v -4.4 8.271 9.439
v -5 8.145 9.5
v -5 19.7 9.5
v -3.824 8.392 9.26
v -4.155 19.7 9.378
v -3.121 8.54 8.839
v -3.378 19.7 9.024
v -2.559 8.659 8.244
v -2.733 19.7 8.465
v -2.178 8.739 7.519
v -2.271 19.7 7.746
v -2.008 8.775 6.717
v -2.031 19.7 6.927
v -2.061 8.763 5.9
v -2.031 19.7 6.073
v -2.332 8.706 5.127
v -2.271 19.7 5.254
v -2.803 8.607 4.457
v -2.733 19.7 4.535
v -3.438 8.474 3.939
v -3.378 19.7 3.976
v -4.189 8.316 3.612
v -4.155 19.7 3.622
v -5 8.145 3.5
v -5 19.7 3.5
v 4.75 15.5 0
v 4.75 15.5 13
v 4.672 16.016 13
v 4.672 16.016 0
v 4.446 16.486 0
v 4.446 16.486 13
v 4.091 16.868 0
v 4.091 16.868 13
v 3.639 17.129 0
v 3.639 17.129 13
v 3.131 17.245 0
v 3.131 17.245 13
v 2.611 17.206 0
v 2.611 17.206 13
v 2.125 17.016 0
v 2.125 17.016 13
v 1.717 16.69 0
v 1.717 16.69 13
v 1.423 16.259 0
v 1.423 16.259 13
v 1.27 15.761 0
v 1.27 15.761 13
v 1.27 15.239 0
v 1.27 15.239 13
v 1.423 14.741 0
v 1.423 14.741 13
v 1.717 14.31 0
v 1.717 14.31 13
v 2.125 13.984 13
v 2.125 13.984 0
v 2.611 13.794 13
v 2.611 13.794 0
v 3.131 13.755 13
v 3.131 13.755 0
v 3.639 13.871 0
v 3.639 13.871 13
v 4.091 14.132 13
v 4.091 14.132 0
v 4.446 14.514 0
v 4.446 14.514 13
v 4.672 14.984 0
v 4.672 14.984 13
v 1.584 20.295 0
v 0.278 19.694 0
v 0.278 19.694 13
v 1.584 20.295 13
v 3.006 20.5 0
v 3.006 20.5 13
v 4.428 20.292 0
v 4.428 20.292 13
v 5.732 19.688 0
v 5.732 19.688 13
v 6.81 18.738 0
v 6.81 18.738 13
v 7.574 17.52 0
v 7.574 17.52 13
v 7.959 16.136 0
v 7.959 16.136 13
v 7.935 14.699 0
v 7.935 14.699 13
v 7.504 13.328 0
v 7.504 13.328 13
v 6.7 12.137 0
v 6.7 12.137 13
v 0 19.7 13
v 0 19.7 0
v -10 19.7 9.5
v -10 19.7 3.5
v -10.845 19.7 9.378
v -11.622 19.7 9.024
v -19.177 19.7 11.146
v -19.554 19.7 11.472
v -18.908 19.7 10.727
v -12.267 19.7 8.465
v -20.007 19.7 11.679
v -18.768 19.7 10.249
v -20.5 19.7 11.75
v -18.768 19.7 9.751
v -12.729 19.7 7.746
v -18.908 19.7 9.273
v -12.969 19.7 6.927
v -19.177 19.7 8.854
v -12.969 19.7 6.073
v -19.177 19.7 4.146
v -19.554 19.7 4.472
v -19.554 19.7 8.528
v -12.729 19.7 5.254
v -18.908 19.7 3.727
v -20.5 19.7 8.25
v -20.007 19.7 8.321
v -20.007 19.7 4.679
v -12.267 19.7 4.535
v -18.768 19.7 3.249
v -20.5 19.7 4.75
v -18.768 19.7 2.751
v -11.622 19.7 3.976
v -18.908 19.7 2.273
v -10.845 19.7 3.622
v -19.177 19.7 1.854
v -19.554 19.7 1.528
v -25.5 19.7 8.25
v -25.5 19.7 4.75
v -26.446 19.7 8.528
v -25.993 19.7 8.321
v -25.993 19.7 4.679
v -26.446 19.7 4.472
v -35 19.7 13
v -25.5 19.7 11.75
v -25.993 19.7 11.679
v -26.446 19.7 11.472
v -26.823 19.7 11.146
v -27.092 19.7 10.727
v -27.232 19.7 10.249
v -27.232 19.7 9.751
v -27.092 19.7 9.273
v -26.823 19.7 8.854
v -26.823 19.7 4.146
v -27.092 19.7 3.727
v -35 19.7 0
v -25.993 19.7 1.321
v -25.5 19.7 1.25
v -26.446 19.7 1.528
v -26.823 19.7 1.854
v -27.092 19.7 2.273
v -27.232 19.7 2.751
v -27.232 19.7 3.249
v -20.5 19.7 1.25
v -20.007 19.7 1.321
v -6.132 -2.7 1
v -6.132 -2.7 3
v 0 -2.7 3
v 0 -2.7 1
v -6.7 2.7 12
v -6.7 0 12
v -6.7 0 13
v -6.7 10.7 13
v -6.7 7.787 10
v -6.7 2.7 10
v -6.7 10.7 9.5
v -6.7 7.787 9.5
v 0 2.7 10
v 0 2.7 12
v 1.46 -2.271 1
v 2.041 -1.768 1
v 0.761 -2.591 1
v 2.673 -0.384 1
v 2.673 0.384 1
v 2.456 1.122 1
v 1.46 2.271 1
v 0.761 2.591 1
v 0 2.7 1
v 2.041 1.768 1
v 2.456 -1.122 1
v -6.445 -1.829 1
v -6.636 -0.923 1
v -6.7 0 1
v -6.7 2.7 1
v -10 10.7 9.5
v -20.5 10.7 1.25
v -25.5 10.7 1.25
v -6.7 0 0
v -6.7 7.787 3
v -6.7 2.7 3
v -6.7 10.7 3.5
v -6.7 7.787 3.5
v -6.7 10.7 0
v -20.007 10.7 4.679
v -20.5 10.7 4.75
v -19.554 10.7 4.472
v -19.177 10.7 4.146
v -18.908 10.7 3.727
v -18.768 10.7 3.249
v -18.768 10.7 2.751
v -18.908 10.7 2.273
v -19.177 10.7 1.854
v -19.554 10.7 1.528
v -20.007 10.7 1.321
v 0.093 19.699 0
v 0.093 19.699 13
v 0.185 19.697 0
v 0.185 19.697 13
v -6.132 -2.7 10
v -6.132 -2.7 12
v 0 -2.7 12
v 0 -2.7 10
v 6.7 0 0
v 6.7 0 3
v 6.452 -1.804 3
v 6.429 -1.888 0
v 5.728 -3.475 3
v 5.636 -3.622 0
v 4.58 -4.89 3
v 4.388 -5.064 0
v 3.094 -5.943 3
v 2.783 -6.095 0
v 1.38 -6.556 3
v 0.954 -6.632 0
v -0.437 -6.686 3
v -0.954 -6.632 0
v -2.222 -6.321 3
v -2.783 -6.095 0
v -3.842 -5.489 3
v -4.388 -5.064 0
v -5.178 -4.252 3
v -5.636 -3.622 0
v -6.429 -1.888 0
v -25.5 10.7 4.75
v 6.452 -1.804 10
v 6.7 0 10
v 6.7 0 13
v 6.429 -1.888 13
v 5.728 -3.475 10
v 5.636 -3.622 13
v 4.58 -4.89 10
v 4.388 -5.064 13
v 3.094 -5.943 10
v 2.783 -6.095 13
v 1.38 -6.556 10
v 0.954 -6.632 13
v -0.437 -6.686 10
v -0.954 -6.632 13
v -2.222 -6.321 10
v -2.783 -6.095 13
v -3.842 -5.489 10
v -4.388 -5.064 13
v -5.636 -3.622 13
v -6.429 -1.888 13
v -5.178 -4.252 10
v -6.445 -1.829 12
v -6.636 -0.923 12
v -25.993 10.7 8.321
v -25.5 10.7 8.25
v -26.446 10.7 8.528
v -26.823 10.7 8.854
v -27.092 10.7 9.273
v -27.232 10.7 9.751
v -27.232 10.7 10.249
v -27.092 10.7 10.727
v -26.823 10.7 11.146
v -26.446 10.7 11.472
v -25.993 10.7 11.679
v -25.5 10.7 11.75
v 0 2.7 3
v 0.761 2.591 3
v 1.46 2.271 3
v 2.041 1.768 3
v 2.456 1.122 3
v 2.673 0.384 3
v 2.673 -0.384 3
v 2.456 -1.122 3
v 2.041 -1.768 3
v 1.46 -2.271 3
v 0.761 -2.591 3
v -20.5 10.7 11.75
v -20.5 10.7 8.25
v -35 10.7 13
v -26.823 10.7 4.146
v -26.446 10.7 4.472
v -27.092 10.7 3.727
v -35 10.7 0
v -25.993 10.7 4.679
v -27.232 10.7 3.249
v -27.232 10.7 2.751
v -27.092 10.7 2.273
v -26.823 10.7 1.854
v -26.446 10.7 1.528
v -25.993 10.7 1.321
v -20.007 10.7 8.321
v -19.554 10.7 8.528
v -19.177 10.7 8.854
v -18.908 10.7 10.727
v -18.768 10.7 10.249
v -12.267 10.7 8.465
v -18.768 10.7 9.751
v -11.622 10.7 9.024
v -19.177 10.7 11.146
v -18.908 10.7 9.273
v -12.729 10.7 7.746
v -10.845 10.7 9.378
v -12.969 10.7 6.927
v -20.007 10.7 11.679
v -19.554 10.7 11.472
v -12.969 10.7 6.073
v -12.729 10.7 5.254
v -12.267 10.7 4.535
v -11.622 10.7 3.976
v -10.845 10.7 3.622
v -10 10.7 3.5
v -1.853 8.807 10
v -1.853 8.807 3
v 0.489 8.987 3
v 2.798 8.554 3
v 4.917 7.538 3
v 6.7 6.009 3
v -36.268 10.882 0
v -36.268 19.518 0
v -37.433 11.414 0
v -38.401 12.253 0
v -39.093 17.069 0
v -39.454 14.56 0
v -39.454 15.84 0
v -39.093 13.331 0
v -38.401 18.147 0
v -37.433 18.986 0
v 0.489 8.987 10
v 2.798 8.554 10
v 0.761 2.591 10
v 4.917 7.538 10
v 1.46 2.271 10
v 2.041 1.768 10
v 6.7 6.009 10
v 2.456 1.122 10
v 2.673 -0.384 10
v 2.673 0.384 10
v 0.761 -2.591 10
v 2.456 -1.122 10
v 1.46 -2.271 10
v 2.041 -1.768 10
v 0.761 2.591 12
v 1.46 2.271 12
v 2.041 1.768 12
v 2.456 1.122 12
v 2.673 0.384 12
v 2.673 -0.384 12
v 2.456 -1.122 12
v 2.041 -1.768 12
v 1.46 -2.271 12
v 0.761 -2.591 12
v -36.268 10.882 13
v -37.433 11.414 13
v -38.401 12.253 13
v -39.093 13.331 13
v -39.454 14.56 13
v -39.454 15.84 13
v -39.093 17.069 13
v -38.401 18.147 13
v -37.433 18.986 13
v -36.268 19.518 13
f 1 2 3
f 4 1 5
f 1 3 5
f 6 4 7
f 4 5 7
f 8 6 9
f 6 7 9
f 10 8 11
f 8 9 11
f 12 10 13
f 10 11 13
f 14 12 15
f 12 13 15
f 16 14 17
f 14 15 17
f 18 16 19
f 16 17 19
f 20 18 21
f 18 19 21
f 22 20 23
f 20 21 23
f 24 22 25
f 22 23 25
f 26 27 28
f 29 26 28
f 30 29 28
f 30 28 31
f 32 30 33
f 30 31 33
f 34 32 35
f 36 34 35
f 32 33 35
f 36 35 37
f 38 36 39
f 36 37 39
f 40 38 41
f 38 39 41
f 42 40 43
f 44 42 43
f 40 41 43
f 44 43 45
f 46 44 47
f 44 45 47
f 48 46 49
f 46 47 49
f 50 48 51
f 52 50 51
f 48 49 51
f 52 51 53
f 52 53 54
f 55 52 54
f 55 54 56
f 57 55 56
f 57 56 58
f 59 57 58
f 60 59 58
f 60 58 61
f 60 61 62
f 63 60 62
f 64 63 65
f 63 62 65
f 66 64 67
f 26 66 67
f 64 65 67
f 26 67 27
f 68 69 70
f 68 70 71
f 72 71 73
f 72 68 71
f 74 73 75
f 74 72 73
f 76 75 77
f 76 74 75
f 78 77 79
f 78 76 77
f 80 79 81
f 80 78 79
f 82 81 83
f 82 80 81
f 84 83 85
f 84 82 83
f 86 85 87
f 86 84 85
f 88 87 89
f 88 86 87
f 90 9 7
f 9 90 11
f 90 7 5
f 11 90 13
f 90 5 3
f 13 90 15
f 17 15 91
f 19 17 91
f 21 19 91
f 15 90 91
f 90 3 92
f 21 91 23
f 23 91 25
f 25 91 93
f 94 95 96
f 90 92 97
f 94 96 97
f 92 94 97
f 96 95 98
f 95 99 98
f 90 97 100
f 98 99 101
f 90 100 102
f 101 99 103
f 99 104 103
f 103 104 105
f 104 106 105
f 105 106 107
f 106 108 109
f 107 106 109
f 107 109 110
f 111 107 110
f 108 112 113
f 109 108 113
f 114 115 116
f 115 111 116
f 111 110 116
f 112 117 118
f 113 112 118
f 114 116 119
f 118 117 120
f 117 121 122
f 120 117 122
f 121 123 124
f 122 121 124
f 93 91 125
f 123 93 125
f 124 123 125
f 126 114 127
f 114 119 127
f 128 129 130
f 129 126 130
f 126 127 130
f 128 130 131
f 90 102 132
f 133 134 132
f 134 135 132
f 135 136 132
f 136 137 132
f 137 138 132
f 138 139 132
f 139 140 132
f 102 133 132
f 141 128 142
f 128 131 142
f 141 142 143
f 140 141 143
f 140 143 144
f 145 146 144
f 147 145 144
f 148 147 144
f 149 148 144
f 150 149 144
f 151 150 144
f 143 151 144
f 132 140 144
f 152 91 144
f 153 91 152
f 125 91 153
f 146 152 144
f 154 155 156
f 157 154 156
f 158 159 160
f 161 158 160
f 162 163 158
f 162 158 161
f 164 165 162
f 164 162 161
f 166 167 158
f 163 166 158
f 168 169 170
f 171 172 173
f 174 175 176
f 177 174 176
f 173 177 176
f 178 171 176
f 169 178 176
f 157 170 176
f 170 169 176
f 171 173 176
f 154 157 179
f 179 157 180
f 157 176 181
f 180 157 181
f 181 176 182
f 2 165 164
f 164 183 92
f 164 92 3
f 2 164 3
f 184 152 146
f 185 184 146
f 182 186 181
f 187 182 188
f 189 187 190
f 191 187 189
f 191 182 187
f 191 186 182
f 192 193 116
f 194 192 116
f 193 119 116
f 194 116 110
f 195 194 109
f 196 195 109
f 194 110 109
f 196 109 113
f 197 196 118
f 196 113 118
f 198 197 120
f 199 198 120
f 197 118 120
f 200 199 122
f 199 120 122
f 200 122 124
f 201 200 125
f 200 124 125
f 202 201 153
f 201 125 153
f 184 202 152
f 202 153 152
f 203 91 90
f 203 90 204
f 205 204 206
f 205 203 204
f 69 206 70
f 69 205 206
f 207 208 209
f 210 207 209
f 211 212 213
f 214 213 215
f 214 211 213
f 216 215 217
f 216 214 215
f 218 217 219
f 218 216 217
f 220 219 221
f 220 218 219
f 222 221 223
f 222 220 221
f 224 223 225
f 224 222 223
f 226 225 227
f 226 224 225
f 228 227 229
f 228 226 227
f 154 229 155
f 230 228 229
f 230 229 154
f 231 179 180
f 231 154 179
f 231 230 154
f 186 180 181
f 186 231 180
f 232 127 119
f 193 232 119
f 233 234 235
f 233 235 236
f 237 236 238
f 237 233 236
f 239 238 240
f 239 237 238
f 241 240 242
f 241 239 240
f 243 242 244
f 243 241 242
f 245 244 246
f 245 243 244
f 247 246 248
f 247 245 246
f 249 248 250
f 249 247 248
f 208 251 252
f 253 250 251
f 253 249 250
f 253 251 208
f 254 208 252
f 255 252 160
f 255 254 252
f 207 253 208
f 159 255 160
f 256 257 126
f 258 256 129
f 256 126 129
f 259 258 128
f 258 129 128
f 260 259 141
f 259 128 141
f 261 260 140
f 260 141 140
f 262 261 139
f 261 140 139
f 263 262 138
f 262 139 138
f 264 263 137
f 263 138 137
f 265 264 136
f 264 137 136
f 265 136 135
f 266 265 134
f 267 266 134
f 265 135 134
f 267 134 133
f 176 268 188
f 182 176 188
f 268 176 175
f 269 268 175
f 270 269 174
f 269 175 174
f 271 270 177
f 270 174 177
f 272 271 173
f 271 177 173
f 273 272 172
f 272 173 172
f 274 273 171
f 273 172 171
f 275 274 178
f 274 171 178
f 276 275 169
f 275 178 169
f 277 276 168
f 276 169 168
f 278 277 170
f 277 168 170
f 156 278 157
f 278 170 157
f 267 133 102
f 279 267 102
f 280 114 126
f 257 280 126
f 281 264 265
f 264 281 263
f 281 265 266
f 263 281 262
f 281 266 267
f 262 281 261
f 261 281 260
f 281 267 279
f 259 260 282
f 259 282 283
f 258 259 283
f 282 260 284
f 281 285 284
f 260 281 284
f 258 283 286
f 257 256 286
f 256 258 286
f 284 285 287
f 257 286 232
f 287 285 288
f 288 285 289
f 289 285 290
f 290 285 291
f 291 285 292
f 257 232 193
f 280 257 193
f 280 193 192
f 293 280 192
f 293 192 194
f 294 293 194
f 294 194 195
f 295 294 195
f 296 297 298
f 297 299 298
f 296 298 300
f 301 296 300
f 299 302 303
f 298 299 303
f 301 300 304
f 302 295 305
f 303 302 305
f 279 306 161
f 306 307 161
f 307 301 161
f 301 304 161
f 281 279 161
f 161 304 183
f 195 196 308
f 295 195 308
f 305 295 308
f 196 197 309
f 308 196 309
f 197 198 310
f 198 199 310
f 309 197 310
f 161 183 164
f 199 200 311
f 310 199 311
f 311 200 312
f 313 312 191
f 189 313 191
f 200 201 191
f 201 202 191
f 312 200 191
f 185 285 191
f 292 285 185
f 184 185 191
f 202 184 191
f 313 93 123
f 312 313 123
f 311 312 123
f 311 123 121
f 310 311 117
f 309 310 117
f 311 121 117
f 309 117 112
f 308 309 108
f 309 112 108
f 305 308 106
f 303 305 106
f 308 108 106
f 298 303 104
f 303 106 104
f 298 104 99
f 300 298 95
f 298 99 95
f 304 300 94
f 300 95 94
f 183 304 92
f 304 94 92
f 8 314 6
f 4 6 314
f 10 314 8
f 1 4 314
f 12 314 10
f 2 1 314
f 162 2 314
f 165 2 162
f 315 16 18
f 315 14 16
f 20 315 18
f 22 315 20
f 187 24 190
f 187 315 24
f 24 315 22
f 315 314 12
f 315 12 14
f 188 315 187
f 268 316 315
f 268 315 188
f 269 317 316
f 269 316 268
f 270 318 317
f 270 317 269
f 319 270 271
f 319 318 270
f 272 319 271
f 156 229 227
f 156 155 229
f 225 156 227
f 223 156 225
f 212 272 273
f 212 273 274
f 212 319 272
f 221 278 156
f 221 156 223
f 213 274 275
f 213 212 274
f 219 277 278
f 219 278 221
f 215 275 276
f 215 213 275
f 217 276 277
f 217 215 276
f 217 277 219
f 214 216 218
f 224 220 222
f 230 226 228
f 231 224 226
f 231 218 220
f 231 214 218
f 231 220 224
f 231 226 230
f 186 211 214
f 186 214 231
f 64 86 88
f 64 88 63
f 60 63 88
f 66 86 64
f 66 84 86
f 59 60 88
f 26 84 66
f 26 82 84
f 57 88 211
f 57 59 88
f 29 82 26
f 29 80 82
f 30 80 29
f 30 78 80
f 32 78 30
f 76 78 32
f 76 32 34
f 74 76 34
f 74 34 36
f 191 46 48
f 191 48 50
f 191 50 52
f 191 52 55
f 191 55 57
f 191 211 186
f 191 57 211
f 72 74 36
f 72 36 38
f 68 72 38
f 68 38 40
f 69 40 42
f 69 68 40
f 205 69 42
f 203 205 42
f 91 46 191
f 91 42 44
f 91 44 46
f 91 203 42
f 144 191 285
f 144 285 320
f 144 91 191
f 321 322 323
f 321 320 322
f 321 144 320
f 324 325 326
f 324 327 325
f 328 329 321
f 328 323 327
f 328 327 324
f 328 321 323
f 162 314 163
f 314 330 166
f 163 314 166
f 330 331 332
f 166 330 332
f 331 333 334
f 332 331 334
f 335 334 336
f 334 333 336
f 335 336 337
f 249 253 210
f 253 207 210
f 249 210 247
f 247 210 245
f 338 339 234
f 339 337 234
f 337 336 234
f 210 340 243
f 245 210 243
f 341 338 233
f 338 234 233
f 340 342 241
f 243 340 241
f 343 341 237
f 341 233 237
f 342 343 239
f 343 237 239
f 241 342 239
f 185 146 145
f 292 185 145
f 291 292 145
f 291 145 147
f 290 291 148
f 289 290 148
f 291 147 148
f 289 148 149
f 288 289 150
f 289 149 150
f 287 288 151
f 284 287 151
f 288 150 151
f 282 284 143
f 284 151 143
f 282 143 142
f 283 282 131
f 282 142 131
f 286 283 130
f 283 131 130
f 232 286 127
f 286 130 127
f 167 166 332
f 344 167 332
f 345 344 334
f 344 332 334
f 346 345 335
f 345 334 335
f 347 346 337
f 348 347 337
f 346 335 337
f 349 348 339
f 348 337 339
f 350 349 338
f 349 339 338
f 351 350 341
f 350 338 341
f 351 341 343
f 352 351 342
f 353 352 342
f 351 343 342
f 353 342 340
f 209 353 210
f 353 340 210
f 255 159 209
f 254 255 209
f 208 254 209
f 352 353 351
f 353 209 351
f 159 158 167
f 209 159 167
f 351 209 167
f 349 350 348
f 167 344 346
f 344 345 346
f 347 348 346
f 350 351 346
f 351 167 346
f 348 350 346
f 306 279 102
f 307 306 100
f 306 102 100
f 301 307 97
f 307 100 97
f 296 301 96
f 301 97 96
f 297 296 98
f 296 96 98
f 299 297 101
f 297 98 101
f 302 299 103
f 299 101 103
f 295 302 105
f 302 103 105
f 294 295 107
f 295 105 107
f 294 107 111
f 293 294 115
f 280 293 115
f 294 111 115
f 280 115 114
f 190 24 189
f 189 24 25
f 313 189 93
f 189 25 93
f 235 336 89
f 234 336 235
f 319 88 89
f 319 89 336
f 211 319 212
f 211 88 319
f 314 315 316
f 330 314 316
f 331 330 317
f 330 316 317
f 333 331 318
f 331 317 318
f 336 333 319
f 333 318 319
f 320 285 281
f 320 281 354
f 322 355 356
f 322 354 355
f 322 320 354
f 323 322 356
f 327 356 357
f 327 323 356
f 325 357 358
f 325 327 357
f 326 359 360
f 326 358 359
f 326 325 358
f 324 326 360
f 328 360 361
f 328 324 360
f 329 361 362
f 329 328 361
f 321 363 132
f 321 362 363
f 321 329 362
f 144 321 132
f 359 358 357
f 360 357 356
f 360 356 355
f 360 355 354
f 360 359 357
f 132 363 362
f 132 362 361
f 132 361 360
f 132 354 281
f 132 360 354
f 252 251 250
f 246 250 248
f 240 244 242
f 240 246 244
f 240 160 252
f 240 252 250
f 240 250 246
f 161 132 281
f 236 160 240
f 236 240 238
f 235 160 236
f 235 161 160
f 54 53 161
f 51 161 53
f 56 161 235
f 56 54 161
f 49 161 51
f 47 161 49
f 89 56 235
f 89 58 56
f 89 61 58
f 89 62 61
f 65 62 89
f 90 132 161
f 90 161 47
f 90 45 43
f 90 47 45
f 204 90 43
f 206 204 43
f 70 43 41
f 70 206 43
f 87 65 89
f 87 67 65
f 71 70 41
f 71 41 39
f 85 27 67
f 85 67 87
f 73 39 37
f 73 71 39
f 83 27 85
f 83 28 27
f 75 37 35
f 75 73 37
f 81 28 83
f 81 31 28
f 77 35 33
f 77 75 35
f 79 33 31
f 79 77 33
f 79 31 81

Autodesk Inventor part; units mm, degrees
ref_plane "YZ Plane" through (0, 0, 0) normal (1, 0, 0) x (0, 1, 0)
ref_plane "XZ Plane" through (0, 0, 0) normal (0, 1, 0) x (-1, 0, 0)
ref_plane "XY Plane" through (0, 0, 0) normal (0, 0, 1) x (1, 0, 0)
sketch "Sketch1" plane through (0, 0, 0) normal (0, 0, 1) x (1, 0, 0)
  circle A0 centre (0, 0) radius 2.7
  line L0 (0, 0) -> (0, 13) construction
  line L1 (-6.7, 0) -> (-6.7, 13)
  line L2 (6.7, 13) -> (6.7, 0)
  arc A1 (-6.7, 0) -> (6.7, 0) centre (0, 0) ccw
  arc A2 (6.7, 13) -> (-6.7, 13) centre (0, 13) ccw
  circle A3 centre (0, 0) radius 2.5 construction
  line L3 (-35, 15.2) -> (0, 15.2) construction
  line L4 (-35, 10.7) -> (0, 10.7)
  line L5 (0, 19.7) -> (-35, 19.7)
  arc A4 (-35, 19.7) -> (-35, 10.7) centre (-35, 15.2) ccw
  arc A5 (0, 10.7) -> (0, 19.7) centre (0, 15.2) ccw
  line L6 (0, 13) -> (0, 19.7) construction
  circle A6 centre (3, 15.5) radius 1.5 construction
  circle A7 centre (3, 15.5) radius 5
  point P0 (0, 6.5)
  point P1 (-17.5, 15.2)
  dimension "d2" = 0.2
  dimension "d3" = 4
  dimension "d5" = 13
  dimension "d10" = 9
  dimension "d11" = 35
  dimension "d12" = 10
extrude "Extrusion1" add sketch "Sketch1" along normal blind 13
sketch "Sketch8" plane through (0, 0, 13) normal (0, 0, 1) x (1, 0, 0)
  line L0 (0, 2.7) -> (-16.9826, 2.7)
  line L1 (-16.9826, -2.7) -> (0, -2.7)
  arc A0 (0, -2.7) -> (0, 2.7) centre (0, 0) ccw
  arc A1 (-16.9826, 2.7) -> (-16.9826, -2.7) centre (-16.9826, 0) ccw
  circle A2 centre (0, 0) radius 2.7 construction
  line L2 (-16.9826, 0) -> (0, 0) construction
  point P0 (-3.3627, 0)
  dimension "d25" = 16.9826
extrude "Extrusion6" cut sketch "Sketch8" against normal through all
sketch "Sketch9" plane through (0, 0, 13) normal (0, 0, 1) x (1, 0, 0)
  arc A0 (0, -2.7) -> (0, 2.7) centre (0, 0) ccw construction
  arc A1 (-6.1319, -2.7) -> (6.7, 0) centre (0, 0) ccw construction
  line L0 (0, 0) -> (0, 13) construction
  line L1 (6.7, 0) -> (6.7, 13)
  line L2 (-6.7, 13) -> (-6.7, 0)
  arc A2 (-6.7, 0) -> (6.7, 0) centre (0, 0) ccw
  arc A3 (6.7, 13) -> (-6.7, 13) centre (0, 13) ccw construction
  line L3 (0, 19.7) -> (-35, 19.7) projected
  line L4 (-6.7, 13) -> (6.7, 13)
  point P0 (0, 6.5)
extrude "Extrusion7" add sketch "Sketch9" against normal blind 1
ref_plane "Work Plane1" through (0, 0, 6.5) normal (0, 0, 1) x (1, 0, 0)
mirror "Mirror3" about plane through (0, 0, 6.5) normal (0, 0, 1) of "Extrusion7"
sketch "Sketch2" plane through (-35, 19.7, 0) normal (0, 1, 0) x (1, 0, 0)
  circle A0 centre (12, -3) radius 1.6 construction
  line L0 (52.5, -6.5) -> (-14, -6.5) construction
  line L1 (9.5, -3) -> (14.5, -3) construction
  line L2 (9.5, -4.75) -> (14.5, -4.75)
  line L3 (14.5, -1.25) -> (9.5, -1.25)
  arc A1 (9.5, -1.25) -> (9.5, -4.75) centre (9.5, -3) ccw
  arc A2 (14.5, -4.75) -> (14.5, -1.25) centre (14.5, -3) ccw
  point P0 (35, 0)
  dimension "d6" = 3.5
  dimension "d7" = 5
extrude "Extrusion2" cut sketch "Sketch2" against normal through all
ref_plane "Work Plane2" through (0, 0, 0) normal (1, 0, 0) x (0, 0, -1)
sketch "Sketch4" plane through (0, 0, 0) normal (1, 0, 0) x (0, 0, -1)
  line L0 (-4, -7.79) -> (-4, 7.79) construction
  line L1 (-8.79, -8) -> (-4.21, -8) construction
  line L2 (-9, -7.79) -> (-9, 7.79) construction
  line L3 (-8.79, 8) -> (-4.21, 8) construction
  line L4 (-4.21, 8) -> (-4, 8) construction
  line L5 (-4, 8) -> (-4, 7.79) construction
  line L6 (-9, -7.79) -> (-9, -8) construction
  line L7 (-9, -8) -> (-8.79, -8) construction
  line L8 (-4, 8) -> (-9, -8) construction
  line L9 (-10, -9) -> (-3, -9)
  line L10 (-3, -9) -> (-3, 9)
  line L11 (-3, 9) -> (-10, 9)
  line L12 (-10, 9) -> (-10, -9)
  line L13 (0, 0) -> (-13, 0) projected
  line L14 (-10, -9) -> (-3, 9) construction
  line L15 (-3, -9) -> (-10, 9) construction
  line L16 (-3, 0) -> (-10, 0)
  point P0 (-6.5, 0)
  dimension "d15" = 1
  dimension "d16" = 1
revolve "Revolution1" cut sketch "Sketch4" angle 360 about axis through (0, 0, 0) along (0, 0, 1) contours L12 L13 L10 L9
sketch "Sketch5" plane through (0, 0, 13) normal (0, 0, 1) x (1, 0, 0)
  arc A0 (6.7, 12.137) -> (0.2781, 19.6942) centre (3, 15.5) ccw construction
  circle A1 centre (3, 15.5) radius 1.75
  point P0 (0, 0)
  dimension "d18" = 3.5
extrude "Extrusion3" cut sketch "Sketch5" against normal through all
sketch "Sketch7" plane through (0, 0, 3) normal (0, 0, 1) x (0.9786, 0.2059, 0)
  line L0 (0, 0) -> (0, 9) construction
  arc A0 (7.7937, 4.5008) -> (-5.3191, 7.26) centre (0, 0) ccw construction
  line L1 (-6.7, -9) -> (6.7, -9)
  line L2 (6.7, -9) -> (6.7, 9)
  line L3 (6.7, 9) -> (-6.7, 9)
  line L4 (-6.7, 9) -> (-6.7, -9)
  line L5 (-6.7, -9) -> (6.7, 9) construction
  line L6 (6.7, -9) -> (-6.7, 9) construction
  line L7 (7.7937, 4.5008) -> (6.5564, -1.3796) construction
  line L8 (-6.7, -9) -> (0, -9)
  line L9 (0, -9) -> (0, 9)
  line L10 (0, 9) -> (-6.7, 9)
  line L11 (-6.7, 9) -> (-6.7, -9)
extrude "Extrusion5" cut sketch "Sketch7" along normal up to surface (7 mm away) contours L4 L3 L9 L1
mirror "Mirror4" about plane through (0, 0, 6.5) normal (0, 0, 1) of "Extrusion2"
sketch "Sketch10" plane through (-35, 19.7, 0) normal (0, 1, 0) x (1, 0, 0)
  circle A0 centre (27.5, -6.5) radius 4.35 construction
  line L0 (25, -6.5) -> (30, -6.5) construction
  line L1 (28.3, -3) -> (28.3, -10) projected
  line L2 (25, -9.5) -> (30, -9.5)
  line L3 (30, -3.5) -> (25, -3.5)
  arc A1 (25, -3.5) -> (25, -9.5) centre (25, -6.5) ccw
  arc A2 (30, -9.5) -> (30, -3.5) centre (30, -6.5) ccw
  point P0 (35, 0)
  dimension "d30" = 5
  dimension "d31" = 3
extrude "Extrusion8" cut sketch "Sketch10" against normal through all
properties part number "Extruder Clamp"
